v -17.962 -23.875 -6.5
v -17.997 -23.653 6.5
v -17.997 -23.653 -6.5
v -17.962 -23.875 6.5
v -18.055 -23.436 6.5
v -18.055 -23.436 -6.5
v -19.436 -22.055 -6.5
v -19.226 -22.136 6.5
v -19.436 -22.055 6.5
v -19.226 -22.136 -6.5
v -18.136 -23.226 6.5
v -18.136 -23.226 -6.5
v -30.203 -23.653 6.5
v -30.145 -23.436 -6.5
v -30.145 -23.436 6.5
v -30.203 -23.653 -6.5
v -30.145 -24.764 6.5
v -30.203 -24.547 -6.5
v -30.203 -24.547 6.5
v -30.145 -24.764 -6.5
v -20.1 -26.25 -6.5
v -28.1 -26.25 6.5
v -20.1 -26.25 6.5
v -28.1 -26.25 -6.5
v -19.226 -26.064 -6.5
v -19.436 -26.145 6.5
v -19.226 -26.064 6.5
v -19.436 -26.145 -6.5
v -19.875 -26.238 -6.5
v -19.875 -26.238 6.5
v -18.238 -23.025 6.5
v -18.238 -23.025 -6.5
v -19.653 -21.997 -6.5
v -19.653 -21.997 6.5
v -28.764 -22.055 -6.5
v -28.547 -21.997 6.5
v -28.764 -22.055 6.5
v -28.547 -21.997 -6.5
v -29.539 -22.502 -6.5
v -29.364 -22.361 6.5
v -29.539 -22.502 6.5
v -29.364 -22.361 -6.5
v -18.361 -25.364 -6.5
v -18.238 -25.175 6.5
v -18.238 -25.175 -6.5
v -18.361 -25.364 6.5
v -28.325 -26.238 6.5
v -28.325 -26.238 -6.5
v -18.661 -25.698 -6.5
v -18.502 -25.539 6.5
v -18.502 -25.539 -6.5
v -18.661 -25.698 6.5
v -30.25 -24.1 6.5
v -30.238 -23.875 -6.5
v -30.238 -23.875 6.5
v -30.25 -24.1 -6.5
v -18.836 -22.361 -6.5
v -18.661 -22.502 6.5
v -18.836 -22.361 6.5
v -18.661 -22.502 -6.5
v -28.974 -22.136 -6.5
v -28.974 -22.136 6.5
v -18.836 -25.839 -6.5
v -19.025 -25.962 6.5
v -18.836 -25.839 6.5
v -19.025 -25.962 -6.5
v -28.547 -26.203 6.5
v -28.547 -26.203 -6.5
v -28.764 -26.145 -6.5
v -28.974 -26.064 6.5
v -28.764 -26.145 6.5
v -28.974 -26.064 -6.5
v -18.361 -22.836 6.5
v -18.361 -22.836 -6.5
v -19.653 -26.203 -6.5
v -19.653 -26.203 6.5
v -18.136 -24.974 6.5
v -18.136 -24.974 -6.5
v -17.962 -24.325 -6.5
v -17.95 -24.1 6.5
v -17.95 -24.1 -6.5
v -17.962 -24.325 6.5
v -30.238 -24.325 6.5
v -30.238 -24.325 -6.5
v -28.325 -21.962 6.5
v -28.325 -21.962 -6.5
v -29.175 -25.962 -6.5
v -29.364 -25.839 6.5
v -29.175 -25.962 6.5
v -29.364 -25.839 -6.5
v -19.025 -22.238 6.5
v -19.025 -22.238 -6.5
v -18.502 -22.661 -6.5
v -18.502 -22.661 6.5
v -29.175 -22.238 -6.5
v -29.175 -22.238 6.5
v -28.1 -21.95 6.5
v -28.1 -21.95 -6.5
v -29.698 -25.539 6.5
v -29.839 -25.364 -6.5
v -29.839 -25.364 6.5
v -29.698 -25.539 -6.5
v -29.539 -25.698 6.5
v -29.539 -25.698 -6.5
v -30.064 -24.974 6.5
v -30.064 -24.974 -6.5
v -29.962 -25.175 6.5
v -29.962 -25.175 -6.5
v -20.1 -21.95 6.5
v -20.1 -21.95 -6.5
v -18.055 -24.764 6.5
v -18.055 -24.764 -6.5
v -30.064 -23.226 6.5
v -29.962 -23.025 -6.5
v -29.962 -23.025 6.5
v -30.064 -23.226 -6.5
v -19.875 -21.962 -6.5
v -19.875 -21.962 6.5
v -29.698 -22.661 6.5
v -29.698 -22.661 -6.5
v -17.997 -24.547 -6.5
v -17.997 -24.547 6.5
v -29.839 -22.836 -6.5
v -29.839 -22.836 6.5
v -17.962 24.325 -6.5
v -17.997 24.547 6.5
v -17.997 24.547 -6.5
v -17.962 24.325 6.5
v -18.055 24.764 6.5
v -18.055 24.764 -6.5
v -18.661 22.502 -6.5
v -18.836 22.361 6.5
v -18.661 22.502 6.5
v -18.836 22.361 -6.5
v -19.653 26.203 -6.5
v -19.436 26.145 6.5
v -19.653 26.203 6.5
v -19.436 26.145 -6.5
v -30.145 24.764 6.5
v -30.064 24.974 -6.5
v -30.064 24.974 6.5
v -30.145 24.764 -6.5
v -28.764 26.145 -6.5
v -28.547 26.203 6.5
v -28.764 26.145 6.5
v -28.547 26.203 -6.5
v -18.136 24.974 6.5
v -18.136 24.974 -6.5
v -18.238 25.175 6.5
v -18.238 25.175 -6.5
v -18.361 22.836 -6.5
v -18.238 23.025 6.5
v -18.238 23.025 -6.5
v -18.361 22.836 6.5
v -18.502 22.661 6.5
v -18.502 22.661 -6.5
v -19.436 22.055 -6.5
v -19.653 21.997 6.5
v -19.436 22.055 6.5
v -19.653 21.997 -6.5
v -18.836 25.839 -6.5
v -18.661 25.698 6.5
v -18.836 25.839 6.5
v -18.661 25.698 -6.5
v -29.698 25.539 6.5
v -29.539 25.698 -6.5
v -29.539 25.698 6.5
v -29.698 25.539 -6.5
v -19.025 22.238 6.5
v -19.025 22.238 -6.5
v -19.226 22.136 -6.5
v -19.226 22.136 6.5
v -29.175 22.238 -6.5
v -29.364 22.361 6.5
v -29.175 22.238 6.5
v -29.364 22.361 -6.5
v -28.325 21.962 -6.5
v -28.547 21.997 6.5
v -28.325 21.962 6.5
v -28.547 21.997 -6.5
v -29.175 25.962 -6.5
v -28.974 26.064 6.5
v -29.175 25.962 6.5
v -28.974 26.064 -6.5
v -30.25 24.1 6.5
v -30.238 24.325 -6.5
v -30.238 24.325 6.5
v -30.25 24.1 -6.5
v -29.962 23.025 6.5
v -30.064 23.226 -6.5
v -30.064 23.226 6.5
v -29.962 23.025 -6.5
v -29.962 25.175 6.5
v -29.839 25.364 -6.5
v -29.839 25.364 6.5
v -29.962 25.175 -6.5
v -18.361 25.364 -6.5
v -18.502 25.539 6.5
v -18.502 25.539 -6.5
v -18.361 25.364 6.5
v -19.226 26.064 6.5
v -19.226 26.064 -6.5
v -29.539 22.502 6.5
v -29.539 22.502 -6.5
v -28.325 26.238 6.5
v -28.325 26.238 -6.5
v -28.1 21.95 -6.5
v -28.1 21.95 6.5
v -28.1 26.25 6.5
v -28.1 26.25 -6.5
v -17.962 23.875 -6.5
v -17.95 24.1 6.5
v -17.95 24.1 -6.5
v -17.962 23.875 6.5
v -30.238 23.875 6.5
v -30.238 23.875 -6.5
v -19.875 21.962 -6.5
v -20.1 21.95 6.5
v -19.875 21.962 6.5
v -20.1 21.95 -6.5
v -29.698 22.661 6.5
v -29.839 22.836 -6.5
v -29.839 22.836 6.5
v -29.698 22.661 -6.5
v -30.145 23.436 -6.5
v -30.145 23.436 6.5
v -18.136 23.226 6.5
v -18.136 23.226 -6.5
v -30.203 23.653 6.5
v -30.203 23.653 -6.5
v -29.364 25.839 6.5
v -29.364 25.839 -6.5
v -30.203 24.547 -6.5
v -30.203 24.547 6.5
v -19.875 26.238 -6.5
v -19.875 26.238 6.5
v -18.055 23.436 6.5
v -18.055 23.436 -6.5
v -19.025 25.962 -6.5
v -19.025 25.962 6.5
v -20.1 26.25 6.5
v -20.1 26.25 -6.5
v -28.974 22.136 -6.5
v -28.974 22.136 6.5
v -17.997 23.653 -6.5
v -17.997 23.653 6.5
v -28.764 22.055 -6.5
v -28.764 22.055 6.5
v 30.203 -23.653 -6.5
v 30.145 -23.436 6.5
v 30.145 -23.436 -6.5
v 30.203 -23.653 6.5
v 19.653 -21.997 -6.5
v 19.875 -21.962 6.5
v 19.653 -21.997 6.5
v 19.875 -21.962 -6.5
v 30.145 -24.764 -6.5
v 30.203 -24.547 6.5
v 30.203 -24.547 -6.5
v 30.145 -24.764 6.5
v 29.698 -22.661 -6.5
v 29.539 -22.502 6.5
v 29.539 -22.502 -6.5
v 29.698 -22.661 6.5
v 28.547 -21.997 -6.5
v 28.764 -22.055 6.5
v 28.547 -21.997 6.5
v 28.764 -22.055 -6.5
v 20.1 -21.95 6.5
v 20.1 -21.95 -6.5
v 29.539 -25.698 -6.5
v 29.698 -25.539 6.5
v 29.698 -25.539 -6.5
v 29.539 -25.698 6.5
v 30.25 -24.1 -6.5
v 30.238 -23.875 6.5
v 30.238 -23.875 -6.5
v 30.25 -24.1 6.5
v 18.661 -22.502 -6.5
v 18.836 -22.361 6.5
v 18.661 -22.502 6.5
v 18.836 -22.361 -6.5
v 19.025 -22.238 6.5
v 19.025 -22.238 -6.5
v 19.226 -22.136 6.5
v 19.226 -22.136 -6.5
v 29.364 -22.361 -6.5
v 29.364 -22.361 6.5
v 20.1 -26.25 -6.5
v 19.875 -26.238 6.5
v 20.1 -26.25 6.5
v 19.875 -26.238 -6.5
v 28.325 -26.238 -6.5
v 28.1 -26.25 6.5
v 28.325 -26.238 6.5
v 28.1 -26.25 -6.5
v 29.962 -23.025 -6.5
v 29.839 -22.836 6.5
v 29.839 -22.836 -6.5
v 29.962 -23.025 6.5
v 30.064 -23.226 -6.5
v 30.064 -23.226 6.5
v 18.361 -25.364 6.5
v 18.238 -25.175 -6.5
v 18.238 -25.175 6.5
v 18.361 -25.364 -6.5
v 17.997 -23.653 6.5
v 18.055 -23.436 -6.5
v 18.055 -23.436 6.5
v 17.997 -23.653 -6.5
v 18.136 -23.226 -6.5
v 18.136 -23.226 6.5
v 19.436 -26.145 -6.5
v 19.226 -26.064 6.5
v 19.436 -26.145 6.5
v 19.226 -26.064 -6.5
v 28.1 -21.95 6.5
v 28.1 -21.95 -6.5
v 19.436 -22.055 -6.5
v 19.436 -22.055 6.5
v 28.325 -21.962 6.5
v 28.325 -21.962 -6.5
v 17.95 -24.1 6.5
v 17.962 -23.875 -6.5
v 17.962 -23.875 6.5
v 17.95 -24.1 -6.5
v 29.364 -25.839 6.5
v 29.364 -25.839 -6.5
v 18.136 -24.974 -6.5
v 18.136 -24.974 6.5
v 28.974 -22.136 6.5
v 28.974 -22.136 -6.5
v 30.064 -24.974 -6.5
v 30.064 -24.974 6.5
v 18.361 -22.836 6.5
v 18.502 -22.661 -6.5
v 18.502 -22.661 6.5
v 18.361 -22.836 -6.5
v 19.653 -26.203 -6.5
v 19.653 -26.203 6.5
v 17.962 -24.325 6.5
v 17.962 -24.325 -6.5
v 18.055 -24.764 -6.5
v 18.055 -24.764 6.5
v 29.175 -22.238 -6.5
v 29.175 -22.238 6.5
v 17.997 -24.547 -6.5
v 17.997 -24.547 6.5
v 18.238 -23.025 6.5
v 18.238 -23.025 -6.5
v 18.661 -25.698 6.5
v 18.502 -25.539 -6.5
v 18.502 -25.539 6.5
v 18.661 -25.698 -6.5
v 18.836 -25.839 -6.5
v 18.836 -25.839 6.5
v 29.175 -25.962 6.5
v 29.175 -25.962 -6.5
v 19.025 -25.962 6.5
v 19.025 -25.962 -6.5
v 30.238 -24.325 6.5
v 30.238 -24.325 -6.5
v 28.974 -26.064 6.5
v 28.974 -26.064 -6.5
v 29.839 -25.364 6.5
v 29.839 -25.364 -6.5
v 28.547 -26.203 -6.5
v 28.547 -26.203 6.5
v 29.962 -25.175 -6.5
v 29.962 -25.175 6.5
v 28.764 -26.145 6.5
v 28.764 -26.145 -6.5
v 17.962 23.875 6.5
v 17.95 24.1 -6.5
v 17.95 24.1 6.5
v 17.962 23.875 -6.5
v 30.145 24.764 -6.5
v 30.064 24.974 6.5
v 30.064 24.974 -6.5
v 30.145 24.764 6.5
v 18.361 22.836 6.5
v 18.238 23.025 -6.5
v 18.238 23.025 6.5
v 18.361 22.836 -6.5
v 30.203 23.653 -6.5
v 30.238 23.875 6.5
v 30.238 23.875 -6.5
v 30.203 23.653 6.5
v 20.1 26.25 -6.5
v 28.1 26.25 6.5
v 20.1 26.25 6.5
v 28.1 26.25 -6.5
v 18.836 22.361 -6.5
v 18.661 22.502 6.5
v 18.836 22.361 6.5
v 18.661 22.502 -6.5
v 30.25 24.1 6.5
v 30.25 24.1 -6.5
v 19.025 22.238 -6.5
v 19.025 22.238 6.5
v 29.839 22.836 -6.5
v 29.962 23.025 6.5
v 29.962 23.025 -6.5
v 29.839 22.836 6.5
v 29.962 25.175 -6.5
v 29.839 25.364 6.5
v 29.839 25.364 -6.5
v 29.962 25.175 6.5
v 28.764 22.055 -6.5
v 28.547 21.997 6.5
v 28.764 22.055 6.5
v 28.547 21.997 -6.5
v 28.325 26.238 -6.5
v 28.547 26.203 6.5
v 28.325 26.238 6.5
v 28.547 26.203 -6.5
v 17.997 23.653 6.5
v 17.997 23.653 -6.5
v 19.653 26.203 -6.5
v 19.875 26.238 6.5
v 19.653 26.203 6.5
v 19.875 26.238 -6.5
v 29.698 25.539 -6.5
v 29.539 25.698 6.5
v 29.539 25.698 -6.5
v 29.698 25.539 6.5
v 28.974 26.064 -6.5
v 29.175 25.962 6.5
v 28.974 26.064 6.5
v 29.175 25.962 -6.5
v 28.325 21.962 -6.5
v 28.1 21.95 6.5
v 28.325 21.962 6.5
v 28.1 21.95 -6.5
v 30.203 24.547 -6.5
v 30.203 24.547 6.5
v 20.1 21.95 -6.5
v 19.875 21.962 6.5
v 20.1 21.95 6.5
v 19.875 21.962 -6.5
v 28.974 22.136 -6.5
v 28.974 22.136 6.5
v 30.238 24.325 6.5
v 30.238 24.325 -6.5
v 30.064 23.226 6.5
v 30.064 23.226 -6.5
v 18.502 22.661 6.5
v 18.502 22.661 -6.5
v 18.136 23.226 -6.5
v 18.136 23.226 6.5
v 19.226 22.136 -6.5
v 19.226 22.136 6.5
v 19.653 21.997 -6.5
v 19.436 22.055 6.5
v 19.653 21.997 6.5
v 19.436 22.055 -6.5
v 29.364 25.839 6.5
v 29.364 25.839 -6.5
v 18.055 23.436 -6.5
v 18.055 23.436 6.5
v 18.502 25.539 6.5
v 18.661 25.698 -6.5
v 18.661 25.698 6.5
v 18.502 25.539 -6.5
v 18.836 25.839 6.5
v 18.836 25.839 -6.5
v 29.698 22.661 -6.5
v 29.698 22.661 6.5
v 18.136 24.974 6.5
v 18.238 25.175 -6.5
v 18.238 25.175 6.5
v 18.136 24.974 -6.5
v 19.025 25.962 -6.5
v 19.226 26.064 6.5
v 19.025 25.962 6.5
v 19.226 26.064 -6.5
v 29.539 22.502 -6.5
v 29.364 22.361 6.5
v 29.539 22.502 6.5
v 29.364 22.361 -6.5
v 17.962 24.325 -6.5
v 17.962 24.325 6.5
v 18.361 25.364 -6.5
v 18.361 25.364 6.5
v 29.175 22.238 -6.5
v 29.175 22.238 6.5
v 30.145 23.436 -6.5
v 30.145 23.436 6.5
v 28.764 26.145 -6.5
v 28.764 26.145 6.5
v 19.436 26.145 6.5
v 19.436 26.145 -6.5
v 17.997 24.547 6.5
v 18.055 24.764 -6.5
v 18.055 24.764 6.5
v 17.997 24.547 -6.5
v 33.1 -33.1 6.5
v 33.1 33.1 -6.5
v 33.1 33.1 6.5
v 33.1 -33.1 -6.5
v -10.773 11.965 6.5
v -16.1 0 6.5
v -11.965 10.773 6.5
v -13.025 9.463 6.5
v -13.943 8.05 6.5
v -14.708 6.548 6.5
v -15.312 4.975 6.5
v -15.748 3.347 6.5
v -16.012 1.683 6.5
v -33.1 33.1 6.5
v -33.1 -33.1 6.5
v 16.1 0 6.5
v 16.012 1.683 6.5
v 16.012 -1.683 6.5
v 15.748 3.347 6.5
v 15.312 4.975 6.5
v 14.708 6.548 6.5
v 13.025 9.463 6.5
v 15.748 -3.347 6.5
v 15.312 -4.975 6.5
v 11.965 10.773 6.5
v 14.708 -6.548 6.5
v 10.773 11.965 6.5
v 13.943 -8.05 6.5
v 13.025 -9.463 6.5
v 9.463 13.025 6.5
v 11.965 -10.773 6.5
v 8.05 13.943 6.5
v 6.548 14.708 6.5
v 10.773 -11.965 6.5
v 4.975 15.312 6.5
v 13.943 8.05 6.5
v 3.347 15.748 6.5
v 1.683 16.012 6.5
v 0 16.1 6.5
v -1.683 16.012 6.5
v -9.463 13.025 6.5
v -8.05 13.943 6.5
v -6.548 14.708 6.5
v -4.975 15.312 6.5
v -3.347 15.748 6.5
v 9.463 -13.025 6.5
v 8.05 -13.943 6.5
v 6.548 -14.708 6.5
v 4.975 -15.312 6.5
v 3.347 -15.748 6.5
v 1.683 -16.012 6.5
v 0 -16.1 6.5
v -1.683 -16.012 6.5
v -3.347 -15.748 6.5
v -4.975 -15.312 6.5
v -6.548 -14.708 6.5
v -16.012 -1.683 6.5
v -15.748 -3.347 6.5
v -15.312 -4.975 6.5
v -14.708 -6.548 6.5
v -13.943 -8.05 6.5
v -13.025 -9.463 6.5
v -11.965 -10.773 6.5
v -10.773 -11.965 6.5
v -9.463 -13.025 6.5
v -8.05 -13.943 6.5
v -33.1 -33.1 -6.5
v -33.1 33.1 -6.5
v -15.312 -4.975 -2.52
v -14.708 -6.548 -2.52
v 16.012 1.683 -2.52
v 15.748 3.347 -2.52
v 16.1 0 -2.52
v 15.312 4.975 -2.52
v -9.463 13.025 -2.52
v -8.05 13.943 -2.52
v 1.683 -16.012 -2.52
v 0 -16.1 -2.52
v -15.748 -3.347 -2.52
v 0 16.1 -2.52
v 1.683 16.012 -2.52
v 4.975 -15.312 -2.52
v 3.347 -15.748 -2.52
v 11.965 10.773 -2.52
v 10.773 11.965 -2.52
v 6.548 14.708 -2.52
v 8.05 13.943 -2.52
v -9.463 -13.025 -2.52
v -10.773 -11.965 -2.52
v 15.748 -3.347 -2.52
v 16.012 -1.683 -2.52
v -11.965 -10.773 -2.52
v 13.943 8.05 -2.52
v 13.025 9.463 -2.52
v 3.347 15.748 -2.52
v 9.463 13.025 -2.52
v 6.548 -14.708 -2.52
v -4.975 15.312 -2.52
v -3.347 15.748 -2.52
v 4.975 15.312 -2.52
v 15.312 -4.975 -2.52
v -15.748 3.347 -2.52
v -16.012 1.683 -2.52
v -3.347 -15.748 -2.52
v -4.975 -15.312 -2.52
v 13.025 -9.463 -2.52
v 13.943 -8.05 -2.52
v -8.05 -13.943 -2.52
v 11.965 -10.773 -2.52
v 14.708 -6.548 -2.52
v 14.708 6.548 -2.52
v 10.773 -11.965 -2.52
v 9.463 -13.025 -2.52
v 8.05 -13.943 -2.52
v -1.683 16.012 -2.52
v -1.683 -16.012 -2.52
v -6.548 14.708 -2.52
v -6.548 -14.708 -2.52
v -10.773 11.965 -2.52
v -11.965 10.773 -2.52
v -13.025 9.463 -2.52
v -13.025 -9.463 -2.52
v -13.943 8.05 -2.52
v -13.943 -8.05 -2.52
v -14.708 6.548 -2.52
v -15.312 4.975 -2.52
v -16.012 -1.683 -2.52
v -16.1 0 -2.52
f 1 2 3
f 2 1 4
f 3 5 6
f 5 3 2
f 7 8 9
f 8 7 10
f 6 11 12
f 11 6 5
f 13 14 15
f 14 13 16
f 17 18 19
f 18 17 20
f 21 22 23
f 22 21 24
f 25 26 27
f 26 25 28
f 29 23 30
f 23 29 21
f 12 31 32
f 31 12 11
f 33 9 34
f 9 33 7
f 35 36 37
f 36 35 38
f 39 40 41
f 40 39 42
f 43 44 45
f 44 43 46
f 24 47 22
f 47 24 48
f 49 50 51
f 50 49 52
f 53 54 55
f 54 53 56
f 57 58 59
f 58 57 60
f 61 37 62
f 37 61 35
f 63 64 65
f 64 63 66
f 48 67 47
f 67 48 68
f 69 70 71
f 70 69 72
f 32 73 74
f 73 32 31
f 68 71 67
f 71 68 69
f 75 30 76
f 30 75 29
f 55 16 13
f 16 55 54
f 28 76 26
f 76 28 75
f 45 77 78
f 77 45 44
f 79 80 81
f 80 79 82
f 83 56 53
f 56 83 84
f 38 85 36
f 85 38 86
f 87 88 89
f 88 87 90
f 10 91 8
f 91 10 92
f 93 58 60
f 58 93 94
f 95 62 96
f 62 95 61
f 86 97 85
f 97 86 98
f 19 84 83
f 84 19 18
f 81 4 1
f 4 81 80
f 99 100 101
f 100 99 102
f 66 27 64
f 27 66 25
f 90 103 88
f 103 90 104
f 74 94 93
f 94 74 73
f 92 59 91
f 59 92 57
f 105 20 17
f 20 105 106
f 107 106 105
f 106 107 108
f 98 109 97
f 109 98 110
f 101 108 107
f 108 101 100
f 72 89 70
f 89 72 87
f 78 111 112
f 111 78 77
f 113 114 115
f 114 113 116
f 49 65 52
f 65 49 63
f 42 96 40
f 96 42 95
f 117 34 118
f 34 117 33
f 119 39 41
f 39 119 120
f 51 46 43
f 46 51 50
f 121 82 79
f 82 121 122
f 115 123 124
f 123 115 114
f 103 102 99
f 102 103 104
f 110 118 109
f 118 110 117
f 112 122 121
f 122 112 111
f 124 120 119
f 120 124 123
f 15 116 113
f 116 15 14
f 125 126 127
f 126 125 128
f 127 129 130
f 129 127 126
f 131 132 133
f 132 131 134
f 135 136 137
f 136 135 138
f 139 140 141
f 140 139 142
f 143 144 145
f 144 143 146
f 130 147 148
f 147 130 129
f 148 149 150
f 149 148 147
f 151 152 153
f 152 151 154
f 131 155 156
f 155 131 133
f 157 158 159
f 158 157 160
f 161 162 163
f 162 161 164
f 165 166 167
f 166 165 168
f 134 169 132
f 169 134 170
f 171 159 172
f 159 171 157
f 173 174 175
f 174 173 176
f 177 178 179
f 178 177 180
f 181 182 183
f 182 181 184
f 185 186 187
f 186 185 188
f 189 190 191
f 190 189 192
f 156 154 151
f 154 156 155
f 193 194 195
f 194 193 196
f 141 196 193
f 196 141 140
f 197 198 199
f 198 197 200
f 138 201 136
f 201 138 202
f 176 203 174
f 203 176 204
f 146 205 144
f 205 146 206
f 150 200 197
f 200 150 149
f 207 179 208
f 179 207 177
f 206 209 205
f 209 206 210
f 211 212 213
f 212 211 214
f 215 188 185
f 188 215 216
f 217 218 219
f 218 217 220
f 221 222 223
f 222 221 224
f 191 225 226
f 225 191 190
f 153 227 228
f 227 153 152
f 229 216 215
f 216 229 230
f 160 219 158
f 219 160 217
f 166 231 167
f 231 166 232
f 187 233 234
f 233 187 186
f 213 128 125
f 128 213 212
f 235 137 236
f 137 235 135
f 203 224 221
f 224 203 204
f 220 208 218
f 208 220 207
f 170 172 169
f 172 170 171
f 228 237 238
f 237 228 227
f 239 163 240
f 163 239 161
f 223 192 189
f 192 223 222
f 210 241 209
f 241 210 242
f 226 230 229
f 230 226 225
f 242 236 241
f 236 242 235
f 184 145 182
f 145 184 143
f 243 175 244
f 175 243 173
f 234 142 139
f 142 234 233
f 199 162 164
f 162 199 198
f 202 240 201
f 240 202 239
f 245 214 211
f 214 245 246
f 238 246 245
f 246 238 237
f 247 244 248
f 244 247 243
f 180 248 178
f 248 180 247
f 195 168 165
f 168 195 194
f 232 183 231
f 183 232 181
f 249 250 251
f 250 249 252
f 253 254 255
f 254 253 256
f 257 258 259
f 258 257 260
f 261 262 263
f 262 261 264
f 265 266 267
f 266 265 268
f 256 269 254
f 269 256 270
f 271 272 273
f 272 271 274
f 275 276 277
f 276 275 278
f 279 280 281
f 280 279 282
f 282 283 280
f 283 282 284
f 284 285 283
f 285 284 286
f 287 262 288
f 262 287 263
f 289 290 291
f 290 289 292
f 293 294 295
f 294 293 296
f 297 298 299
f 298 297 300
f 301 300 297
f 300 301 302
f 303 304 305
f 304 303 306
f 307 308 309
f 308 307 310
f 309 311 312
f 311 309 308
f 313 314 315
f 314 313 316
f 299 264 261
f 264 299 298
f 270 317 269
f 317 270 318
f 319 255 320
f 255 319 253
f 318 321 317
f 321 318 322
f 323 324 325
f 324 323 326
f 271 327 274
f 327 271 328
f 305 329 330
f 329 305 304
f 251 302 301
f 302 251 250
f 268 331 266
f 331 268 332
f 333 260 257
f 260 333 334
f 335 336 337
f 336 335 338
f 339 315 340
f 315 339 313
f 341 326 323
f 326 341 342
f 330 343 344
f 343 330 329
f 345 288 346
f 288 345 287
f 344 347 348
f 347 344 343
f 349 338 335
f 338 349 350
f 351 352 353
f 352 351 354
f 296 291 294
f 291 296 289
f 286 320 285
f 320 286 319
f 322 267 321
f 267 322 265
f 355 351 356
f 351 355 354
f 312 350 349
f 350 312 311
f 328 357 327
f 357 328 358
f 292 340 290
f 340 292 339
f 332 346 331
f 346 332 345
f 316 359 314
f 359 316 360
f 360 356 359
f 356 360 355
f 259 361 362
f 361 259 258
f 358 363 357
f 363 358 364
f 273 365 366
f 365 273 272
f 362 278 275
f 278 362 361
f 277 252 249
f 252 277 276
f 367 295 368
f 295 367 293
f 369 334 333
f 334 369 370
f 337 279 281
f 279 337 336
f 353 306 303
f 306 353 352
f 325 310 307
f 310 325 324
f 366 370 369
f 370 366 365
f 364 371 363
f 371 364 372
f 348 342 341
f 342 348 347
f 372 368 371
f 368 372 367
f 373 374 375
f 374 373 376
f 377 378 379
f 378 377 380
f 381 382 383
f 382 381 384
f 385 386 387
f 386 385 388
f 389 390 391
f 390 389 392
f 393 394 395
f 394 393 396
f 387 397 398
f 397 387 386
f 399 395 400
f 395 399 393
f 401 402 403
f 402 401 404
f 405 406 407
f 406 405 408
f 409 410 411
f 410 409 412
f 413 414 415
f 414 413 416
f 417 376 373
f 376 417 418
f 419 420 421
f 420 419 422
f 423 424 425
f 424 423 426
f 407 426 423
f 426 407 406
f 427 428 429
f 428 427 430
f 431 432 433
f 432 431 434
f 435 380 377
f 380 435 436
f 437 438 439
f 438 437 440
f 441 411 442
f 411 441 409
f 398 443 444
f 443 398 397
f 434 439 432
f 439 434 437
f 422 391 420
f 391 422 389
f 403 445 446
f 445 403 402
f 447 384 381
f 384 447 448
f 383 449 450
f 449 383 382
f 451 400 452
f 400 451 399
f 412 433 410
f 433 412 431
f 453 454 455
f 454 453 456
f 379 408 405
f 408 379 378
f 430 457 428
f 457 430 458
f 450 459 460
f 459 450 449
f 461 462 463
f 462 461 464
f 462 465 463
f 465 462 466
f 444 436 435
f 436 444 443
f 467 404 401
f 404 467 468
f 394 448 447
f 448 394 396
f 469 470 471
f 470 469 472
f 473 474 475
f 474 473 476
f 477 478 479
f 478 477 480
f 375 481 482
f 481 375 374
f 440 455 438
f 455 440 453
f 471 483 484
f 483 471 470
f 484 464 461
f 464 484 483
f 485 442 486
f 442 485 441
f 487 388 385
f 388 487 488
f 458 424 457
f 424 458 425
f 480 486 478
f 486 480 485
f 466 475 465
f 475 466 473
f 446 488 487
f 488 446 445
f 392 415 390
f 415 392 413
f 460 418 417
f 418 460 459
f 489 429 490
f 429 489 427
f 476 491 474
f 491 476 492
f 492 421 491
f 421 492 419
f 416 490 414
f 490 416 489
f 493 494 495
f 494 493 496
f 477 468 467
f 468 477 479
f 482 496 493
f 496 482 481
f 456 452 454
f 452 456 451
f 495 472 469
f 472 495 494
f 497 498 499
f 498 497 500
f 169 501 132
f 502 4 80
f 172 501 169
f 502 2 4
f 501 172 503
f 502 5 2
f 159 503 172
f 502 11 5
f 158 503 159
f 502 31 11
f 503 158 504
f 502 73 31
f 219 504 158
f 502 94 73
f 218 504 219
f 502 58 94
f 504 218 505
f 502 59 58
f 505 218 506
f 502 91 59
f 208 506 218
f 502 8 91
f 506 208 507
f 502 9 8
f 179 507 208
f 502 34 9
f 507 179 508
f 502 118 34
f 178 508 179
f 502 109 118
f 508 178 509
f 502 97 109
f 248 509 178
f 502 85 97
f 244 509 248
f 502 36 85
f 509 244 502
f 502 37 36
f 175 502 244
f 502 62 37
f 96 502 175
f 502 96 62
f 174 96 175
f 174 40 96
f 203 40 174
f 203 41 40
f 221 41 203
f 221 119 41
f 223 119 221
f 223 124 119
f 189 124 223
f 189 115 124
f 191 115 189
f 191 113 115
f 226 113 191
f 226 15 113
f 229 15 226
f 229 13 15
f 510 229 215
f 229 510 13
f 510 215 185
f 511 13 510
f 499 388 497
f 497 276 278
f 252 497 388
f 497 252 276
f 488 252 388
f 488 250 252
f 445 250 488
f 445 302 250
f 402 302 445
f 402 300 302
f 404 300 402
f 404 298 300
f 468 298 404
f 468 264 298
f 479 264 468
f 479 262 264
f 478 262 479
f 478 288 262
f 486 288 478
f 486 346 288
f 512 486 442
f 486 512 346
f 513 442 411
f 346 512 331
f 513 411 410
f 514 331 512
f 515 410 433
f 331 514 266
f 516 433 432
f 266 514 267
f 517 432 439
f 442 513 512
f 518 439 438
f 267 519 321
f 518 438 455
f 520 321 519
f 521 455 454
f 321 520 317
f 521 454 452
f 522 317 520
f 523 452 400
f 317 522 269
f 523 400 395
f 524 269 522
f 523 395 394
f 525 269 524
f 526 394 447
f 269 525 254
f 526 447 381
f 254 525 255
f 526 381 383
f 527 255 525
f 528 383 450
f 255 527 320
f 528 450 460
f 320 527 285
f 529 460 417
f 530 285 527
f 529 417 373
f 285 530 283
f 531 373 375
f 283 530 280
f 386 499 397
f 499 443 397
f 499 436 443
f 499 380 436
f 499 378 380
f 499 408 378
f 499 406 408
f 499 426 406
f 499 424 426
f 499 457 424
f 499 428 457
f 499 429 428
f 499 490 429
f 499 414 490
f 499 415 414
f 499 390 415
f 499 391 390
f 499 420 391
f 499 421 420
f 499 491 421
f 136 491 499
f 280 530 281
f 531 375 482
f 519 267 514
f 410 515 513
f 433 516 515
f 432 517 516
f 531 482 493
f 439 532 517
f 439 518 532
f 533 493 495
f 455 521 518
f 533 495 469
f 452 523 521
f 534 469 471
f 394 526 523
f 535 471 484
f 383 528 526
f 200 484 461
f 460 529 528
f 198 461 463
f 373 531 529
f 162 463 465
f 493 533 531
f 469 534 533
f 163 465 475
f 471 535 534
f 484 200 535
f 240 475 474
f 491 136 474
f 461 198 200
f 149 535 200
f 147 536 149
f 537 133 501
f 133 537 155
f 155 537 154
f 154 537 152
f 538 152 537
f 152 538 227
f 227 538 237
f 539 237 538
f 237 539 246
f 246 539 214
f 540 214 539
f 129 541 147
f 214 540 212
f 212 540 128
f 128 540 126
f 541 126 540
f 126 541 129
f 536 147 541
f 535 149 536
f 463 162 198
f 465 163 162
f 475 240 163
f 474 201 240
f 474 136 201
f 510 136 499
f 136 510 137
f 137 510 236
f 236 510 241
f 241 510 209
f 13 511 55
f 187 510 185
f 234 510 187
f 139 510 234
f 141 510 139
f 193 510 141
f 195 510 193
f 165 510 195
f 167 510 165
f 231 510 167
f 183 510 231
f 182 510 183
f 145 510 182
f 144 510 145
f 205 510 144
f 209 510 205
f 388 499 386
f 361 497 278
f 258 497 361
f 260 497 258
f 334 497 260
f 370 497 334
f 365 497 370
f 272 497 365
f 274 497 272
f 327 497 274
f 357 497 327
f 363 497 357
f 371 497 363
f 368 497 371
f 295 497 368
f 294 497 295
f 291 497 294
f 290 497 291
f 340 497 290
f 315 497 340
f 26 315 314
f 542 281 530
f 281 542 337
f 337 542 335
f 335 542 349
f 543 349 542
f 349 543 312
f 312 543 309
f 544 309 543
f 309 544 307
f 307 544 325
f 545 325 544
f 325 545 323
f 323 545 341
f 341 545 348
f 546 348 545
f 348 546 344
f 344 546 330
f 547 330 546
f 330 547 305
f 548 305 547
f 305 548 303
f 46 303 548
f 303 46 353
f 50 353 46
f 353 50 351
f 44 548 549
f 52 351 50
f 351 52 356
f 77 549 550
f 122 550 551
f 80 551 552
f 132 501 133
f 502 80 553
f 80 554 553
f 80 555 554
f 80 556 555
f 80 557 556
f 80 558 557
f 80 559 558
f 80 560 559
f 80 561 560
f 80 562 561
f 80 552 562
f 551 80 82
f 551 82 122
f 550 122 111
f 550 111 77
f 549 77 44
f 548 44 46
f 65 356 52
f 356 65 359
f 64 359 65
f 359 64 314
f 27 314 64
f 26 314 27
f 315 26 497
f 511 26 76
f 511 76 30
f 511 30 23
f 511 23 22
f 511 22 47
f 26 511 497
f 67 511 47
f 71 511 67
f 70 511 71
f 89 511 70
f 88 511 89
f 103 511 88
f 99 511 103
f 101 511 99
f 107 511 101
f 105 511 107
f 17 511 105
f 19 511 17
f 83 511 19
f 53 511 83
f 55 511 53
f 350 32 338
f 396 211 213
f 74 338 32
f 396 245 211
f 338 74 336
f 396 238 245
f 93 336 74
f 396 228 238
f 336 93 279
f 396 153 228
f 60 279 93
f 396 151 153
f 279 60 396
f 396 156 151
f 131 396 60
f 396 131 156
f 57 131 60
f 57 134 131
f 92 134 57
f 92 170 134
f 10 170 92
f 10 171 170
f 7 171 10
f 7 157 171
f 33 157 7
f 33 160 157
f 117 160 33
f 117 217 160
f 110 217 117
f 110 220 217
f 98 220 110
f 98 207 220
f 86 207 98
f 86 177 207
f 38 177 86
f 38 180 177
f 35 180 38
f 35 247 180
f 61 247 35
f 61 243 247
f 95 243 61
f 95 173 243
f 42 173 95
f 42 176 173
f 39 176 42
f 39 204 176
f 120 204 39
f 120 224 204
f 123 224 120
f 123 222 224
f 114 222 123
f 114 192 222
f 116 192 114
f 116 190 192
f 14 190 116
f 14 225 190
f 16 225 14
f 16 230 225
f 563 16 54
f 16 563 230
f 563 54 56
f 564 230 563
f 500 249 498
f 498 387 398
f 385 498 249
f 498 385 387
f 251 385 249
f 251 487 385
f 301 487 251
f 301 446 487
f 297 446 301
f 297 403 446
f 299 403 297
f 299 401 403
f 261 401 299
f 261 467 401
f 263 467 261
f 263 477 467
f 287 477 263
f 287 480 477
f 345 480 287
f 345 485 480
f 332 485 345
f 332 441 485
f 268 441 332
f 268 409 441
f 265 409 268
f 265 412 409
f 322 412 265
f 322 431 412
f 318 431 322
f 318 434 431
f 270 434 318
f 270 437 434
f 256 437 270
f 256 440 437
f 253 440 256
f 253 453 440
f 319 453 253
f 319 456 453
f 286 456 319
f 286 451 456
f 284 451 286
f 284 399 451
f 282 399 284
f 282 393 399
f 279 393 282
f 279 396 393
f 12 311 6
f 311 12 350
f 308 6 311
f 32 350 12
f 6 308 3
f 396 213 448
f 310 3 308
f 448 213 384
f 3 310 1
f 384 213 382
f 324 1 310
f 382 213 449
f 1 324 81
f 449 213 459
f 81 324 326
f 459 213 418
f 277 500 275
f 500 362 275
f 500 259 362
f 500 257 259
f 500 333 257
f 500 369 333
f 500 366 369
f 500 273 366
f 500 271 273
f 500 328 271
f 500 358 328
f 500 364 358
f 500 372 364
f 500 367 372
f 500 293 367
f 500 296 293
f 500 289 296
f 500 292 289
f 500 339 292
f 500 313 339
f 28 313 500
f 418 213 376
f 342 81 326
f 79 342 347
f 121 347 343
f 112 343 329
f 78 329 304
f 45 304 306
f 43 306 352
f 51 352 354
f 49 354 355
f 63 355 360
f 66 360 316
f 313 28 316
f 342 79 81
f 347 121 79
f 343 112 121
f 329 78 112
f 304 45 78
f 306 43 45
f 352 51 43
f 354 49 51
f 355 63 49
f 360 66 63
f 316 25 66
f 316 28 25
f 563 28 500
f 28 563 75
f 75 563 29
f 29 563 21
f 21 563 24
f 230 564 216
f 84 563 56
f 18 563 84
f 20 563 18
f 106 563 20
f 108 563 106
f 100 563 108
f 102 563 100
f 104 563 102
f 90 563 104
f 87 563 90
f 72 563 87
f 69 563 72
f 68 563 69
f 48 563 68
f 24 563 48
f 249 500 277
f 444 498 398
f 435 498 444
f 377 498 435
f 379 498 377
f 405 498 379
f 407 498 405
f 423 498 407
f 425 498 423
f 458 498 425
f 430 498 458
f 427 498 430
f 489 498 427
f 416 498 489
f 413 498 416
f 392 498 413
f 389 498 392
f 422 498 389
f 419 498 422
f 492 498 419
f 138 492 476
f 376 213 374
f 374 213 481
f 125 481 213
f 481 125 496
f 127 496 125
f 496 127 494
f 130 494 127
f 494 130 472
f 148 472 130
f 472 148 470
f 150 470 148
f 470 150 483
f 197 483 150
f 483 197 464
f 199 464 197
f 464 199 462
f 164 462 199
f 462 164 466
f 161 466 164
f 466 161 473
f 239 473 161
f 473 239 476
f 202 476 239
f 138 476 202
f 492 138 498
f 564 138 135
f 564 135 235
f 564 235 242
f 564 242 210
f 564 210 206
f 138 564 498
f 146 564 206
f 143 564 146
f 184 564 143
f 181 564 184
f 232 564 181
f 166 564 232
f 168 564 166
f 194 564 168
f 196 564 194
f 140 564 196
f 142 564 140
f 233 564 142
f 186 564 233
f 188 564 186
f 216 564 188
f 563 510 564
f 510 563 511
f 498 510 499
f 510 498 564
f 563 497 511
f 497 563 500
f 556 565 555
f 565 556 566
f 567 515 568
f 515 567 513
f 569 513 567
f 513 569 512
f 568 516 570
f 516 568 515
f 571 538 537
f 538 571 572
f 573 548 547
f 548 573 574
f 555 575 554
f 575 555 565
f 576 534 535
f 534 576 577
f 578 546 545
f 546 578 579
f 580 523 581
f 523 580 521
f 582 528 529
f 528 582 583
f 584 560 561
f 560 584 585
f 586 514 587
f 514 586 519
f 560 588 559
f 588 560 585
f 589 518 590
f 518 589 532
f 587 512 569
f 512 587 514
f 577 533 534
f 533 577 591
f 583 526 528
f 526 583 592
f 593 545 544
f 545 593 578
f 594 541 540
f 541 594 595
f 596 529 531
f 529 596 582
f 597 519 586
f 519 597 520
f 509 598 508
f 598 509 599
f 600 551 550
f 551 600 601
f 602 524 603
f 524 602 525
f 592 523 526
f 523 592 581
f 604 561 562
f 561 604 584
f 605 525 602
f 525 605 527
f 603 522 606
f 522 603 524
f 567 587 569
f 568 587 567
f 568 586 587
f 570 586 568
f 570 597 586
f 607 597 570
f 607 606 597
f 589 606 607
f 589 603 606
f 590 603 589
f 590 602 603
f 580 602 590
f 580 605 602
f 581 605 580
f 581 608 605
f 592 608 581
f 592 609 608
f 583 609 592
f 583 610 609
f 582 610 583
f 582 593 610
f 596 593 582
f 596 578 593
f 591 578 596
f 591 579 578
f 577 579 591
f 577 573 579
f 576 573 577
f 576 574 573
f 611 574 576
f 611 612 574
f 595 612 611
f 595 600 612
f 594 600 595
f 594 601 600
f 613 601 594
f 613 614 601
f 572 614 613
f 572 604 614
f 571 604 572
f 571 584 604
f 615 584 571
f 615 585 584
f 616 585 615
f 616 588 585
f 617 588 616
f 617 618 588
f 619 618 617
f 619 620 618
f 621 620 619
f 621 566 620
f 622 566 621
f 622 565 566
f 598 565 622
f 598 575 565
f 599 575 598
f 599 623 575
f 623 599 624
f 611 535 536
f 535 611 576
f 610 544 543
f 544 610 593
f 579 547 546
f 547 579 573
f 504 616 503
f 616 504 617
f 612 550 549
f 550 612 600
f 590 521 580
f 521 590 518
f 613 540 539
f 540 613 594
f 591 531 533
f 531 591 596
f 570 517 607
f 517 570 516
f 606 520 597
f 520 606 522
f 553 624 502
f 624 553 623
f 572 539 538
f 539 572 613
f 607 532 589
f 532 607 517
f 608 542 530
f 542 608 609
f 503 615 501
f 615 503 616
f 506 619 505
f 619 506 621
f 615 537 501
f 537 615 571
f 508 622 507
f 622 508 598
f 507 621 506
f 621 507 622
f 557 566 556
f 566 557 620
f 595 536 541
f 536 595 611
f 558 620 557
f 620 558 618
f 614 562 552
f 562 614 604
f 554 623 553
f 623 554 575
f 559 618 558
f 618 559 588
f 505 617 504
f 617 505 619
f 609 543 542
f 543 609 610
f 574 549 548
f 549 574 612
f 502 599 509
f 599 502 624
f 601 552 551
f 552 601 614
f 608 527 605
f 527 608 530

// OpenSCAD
// Bearing mounting plate with 32.2 mm pocket.
$fn = 60;
eps = 0.02;
plate_w = 66.2;
plate_t = 13;
bearing_d = 32.2;
pocket_d = 9;
mount_pitch = 48.2;
module slot(x, y) {
    hull() {
        translate([x - 4, y, -plate_t / 2 - eps]) cylinder(d = 4.3, h = plate_t + 2 * eps);
        translate([x + 4, y, -plate_t / 2 - eps]) cylinder(d = 4.3, h = plate_t + 2 * eps);
    }
}
difference() {
    cube([plate_w, plate_w, plate_t], center = true);
    translate([0, 0, plate_t / 2 - pocket_d - eps]) cylinder(d = bearing_d, h = pocket_d + 2 * eps);
    for (x = [-mount_pitch / 2, mount_pitch / 2], y = [-mount_pitch / 2, mount_pitch / 2]) slot(x, y);
}
